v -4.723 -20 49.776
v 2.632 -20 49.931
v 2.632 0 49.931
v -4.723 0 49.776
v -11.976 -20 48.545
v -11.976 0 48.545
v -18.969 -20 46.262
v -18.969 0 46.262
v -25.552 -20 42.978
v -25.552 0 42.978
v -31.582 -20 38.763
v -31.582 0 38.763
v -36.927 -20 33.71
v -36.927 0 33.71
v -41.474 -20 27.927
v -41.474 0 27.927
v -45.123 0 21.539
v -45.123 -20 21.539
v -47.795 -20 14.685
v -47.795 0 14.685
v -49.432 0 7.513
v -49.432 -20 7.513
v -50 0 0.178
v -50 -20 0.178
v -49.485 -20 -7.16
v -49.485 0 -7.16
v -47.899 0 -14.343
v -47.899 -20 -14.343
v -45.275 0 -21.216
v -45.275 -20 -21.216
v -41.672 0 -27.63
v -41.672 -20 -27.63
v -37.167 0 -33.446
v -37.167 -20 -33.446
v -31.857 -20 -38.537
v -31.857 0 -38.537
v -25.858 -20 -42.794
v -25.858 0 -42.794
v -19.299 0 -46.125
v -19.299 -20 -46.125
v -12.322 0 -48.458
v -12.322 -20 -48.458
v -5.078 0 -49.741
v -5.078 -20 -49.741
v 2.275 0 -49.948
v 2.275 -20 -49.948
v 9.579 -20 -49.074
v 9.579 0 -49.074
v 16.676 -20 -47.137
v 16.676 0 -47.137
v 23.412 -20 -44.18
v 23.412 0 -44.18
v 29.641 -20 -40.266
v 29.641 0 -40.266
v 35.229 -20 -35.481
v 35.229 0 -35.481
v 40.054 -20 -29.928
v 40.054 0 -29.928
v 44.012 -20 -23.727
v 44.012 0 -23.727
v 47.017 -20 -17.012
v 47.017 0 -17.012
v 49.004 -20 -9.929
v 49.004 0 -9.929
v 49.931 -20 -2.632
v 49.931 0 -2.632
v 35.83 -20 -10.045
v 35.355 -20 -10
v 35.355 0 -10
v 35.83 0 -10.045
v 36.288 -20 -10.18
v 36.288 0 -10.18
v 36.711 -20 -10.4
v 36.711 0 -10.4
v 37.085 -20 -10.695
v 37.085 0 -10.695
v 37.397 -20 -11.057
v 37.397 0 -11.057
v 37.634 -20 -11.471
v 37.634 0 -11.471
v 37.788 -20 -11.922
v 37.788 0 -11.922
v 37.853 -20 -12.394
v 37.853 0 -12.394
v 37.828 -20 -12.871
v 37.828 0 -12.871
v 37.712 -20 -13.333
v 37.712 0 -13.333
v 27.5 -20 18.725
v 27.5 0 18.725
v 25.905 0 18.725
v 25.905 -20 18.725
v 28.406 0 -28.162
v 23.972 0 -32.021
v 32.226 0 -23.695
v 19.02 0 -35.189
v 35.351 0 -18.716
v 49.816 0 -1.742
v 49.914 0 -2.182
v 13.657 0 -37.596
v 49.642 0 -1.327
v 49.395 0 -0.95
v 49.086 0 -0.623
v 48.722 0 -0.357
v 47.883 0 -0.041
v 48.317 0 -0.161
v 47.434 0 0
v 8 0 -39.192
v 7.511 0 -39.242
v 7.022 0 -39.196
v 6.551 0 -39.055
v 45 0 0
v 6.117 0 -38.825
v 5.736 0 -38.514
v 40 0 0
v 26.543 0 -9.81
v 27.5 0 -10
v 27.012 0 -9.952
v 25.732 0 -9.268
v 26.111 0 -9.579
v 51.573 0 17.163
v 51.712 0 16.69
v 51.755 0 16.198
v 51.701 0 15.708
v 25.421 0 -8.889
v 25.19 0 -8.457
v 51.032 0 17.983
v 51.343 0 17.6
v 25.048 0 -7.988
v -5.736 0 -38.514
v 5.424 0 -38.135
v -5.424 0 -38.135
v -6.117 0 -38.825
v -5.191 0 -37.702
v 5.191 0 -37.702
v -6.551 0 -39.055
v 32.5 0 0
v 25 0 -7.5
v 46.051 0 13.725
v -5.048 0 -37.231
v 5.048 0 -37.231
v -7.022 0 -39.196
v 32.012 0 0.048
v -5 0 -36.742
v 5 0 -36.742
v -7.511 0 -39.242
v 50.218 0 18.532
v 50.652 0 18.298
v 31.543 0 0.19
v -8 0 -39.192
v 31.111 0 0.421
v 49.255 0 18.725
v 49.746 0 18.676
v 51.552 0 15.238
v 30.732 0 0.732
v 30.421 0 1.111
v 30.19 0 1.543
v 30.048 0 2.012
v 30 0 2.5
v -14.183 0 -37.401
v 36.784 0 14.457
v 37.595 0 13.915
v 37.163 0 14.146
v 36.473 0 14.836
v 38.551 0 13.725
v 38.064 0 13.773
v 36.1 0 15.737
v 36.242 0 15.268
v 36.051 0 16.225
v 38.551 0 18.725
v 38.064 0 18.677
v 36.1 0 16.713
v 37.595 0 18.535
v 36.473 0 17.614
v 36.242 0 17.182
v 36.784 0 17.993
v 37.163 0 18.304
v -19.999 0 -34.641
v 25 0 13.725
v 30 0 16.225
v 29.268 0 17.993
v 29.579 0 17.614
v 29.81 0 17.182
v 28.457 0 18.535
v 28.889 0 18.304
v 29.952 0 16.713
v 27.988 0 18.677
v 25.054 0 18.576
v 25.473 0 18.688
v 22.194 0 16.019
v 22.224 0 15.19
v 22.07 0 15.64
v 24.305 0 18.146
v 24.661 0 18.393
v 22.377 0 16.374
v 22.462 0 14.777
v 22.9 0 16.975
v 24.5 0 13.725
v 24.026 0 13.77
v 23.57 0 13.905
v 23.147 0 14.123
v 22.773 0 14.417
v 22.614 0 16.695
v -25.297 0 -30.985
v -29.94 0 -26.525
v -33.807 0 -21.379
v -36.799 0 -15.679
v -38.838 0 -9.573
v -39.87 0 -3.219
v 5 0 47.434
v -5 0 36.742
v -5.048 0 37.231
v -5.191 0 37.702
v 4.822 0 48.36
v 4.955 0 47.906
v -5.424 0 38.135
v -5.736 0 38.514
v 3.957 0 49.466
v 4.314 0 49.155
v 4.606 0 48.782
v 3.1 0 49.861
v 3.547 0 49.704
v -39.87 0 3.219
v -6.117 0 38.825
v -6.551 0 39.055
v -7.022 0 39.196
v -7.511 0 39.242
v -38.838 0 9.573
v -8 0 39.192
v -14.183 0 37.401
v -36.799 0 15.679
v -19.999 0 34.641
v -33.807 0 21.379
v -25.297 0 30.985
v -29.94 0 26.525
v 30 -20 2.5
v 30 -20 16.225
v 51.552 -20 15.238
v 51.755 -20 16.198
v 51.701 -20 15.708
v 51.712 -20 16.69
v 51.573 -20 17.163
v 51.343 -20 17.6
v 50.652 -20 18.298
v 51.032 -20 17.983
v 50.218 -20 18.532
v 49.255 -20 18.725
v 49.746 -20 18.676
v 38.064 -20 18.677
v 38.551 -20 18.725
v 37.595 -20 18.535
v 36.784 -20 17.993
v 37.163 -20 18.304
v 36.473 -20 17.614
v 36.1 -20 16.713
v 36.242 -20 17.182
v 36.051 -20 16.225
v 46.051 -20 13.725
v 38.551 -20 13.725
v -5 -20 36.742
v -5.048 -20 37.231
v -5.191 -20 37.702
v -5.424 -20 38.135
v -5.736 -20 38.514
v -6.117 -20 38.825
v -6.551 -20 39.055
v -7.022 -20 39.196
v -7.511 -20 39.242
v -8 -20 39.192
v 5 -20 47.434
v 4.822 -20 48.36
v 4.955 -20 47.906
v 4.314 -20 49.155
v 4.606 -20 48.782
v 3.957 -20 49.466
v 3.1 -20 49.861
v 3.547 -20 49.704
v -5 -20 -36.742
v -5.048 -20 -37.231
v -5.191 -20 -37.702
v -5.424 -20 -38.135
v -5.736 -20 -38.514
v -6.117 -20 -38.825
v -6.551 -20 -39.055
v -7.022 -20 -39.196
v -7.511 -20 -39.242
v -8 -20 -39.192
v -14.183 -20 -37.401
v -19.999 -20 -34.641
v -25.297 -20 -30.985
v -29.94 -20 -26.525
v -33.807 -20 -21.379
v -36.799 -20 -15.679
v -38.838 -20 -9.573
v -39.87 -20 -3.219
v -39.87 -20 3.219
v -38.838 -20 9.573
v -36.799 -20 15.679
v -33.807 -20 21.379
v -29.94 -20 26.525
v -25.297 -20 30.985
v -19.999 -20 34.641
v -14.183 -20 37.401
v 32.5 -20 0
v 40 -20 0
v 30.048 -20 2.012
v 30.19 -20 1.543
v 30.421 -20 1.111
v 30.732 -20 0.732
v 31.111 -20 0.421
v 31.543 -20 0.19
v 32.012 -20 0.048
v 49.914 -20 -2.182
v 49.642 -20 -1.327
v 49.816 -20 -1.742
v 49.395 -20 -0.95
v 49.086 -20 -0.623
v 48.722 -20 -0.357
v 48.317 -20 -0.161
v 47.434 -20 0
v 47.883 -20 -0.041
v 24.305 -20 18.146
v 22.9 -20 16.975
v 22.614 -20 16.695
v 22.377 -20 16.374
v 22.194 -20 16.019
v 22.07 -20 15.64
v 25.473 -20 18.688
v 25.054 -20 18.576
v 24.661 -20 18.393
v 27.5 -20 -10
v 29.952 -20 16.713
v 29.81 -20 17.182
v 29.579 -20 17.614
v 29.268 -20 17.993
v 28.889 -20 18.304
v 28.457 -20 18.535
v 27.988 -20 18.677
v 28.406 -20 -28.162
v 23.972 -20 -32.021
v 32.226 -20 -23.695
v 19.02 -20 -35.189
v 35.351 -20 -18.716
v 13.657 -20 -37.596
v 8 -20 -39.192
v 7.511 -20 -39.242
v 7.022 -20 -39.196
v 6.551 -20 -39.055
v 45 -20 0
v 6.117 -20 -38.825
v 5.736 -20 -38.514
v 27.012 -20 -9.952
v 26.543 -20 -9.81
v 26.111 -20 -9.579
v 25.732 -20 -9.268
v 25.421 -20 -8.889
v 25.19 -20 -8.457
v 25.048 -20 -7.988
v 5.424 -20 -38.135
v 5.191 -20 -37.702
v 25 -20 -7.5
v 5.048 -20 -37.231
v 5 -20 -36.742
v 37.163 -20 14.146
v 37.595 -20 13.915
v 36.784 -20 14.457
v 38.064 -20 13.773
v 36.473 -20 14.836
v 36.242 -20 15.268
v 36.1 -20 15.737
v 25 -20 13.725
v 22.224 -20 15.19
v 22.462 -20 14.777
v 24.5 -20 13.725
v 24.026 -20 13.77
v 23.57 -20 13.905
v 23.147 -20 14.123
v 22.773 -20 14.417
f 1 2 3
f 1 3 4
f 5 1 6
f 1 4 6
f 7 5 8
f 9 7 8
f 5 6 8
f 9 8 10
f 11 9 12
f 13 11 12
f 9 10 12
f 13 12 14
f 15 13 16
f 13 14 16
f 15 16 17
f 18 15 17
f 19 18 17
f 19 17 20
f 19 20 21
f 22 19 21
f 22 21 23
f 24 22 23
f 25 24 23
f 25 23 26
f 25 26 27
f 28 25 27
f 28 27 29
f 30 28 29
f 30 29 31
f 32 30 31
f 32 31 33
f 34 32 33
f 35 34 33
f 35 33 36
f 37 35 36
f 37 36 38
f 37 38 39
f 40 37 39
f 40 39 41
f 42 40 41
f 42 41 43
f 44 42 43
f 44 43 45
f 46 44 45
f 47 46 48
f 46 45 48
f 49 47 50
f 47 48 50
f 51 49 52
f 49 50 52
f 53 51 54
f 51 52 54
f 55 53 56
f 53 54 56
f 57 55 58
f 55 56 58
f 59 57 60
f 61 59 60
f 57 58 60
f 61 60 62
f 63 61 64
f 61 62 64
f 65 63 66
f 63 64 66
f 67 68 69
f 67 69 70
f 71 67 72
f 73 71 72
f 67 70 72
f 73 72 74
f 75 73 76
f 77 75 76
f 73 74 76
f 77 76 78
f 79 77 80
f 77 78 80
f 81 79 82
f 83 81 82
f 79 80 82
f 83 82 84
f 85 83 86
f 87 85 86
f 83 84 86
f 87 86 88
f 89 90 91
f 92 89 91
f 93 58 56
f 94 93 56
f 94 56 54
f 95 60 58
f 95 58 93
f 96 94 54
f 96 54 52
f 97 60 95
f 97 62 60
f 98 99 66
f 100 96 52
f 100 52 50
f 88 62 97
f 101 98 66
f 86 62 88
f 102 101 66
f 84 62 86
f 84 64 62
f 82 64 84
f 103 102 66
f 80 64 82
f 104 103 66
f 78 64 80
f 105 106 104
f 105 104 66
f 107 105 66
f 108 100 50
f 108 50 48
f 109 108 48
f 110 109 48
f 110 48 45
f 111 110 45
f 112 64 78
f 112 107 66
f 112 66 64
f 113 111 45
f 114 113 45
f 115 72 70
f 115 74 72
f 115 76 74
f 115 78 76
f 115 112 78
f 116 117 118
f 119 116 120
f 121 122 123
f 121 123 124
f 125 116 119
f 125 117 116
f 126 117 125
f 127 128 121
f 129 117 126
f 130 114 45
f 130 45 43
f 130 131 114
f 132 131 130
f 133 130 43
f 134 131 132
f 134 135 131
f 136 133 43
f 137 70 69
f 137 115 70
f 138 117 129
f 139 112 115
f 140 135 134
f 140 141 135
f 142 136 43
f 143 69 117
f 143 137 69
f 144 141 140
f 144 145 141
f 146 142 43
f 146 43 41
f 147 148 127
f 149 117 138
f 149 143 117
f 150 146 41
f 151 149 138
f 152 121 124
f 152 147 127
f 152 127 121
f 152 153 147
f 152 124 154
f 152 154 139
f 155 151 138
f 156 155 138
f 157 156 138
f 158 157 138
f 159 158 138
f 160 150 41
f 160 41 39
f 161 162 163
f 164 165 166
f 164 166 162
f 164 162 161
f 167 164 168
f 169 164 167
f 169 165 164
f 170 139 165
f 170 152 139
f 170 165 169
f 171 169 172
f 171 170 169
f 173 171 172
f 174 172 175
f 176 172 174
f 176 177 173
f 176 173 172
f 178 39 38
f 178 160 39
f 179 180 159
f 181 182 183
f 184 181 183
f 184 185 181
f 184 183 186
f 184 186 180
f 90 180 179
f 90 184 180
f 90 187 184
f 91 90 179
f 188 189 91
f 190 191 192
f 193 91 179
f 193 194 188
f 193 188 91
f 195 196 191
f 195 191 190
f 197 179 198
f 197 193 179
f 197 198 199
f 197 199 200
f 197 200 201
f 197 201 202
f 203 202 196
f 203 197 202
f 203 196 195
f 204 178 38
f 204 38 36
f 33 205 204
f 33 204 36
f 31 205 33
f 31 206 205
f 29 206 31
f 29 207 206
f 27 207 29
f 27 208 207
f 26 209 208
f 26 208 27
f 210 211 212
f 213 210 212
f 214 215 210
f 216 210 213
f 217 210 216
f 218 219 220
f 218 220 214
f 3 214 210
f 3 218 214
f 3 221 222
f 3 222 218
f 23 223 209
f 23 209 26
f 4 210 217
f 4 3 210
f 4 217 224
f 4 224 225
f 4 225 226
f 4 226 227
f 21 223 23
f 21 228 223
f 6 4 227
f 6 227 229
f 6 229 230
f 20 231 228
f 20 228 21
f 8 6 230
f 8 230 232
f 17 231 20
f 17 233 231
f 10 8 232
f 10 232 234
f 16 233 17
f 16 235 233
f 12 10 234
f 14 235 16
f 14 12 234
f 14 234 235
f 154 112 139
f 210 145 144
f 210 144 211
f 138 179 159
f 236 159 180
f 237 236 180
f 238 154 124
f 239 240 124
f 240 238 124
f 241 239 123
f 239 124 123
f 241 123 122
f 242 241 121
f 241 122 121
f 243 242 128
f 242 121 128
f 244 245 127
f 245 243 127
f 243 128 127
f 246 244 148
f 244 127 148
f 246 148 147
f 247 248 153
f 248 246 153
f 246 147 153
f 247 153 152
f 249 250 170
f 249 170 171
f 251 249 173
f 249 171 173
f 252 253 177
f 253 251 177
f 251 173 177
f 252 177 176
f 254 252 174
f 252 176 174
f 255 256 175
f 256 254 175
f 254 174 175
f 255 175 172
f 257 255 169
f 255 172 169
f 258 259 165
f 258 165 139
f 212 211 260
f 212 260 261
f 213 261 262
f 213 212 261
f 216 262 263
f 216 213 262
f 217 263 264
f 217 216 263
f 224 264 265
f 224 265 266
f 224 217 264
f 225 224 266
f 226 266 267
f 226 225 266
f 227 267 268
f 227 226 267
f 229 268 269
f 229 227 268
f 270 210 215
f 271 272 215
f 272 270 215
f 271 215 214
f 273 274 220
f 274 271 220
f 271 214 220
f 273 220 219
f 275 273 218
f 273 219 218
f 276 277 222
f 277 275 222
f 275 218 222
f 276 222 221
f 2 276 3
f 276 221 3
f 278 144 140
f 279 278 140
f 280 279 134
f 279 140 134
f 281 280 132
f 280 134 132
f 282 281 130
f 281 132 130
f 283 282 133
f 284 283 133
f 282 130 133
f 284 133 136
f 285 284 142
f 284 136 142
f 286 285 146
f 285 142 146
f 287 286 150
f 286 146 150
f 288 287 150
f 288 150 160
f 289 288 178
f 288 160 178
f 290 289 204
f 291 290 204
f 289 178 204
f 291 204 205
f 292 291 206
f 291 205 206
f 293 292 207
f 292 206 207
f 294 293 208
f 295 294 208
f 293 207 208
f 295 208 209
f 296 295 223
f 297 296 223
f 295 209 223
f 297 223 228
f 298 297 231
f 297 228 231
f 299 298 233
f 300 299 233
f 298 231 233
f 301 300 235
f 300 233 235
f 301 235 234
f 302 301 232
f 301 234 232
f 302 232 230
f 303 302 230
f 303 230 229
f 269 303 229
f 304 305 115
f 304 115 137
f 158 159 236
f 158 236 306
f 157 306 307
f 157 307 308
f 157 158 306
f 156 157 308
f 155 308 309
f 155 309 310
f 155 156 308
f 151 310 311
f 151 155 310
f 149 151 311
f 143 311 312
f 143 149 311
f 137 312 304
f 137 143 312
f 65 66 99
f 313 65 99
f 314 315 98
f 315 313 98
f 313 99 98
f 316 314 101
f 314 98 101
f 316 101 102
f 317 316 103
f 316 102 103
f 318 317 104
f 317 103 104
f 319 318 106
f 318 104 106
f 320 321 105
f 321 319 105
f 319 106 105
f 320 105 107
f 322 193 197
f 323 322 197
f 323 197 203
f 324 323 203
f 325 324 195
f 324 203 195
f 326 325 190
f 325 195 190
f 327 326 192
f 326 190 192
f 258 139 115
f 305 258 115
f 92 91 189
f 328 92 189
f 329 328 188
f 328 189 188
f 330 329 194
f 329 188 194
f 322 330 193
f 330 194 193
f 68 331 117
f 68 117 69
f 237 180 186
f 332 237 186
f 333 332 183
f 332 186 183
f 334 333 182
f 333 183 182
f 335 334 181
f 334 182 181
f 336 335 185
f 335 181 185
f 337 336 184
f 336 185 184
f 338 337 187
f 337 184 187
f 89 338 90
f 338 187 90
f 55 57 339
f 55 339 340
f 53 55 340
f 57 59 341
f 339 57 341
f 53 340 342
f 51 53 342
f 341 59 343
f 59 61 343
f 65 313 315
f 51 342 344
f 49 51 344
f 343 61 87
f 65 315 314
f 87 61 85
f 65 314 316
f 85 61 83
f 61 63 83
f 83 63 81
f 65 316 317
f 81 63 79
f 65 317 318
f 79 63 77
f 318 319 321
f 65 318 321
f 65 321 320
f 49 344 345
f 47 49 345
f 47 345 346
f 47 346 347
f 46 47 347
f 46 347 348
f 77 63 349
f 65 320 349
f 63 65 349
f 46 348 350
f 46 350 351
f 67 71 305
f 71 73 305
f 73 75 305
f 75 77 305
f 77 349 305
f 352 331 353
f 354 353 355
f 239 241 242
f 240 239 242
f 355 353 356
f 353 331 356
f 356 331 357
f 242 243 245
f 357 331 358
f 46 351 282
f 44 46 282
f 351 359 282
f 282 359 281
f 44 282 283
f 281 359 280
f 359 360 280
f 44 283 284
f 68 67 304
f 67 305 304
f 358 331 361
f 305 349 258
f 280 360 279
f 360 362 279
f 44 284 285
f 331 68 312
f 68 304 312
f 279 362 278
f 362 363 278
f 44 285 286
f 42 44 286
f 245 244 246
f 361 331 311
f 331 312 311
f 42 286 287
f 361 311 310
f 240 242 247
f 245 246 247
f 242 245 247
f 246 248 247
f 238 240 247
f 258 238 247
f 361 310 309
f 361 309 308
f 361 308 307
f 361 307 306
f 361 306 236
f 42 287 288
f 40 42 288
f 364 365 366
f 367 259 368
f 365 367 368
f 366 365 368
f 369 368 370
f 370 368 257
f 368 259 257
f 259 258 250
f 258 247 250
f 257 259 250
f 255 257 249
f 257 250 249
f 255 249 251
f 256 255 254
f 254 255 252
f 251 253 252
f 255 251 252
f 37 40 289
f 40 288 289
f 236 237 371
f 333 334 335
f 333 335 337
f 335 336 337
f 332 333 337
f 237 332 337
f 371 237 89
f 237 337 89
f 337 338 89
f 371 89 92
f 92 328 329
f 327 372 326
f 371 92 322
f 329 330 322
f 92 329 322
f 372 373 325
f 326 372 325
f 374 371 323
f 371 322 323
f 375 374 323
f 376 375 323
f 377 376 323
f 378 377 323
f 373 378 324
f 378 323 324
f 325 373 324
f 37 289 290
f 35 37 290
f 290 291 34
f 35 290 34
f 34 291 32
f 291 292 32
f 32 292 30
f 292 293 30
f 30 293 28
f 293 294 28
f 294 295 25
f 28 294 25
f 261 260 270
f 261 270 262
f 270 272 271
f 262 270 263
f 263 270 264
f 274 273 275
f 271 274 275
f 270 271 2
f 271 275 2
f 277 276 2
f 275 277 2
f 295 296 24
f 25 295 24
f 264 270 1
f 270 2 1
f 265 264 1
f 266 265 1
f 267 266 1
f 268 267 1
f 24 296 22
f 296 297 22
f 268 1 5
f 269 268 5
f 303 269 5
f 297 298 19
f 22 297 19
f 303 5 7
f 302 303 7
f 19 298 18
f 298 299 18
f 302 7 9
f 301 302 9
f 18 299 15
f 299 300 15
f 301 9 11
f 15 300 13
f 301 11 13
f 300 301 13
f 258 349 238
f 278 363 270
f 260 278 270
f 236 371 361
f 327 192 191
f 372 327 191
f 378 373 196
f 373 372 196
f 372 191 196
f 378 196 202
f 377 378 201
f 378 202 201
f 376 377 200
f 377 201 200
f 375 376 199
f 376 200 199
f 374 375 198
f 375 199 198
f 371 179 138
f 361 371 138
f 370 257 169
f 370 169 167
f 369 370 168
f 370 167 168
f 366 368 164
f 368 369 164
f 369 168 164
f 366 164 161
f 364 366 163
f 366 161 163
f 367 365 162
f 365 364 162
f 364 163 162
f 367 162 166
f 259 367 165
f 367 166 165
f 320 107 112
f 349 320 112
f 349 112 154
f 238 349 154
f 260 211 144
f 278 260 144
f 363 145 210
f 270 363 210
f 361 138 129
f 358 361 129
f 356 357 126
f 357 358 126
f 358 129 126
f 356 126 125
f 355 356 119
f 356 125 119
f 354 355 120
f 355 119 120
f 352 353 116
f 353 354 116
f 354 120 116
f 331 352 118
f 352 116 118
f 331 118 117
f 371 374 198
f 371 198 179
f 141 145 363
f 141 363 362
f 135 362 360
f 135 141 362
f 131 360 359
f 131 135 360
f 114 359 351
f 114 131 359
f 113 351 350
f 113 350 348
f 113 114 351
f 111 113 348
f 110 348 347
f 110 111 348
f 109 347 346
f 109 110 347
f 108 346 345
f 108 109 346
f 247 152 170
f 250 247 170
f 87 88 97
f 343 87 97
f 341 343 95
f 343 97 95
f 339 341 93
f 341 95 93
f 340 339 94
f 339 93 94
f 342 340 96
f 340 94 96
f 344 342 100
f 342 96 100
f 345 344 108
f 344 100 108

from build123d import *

# Parameters (mm, degrees)
F1_DEPTH     = 20
F2_T1_DEPTH  = 20
F2_T3_DEPTH  = 31.8767610709
F2_T5_DEPTH  = 38.9813299321
F2_T7_DEPTH  = 32.5
F2_T9_DEPTH  = 33.1624563251
F2_T11_DEPTH = 24.5256241898
F2_T13_DEPTH = 25.8546868248


# Not quite as in the source:
# - a fillet or chamfer that OpenCascade refuses, or shapes differently, is made with other operations: its cross-section is extruded or revolved along the edge and cut away or added


with BuildPart() as f1:
    # F0 (on Front) → F1 (new body)
    with BuildSketch(Plane.XZ):
        with BuildLine():
            Line((5, -39.686269666), (5, 0))
            Line((5, 0), (5, 49.7493718553))
            ThreePointArc((5, 49.7493718553), (-37.0809924355, -33.5410196625), (50, 0))
            Line((50, 0), (45, 0))
            Line((45, 0), (53.0514801827, 18.7251443562))
            Line((53.0514801827, 18.7251443562), (36.0514801827, 18.7251443562))
            Line((36.0514801827, 18.7251443562), (36.0514801827, 13.7251443562))
            Line((36.0514801827, 13.7251443562), (46.0514801827, 13.7251443562))
            Line((46.0514801827, 13.7251443562), (40, 0))
            Line((40, 0), (30, 0))
            Line((30, 0), (30, 18.7251443562))
            Line((30, 18.7251443562), (25, 18.7251443562))
            Line((25, 18.7251443562), (22, 16.2251443562))
            Line((22, 16.2251443562), (22, 13.7251443562))
            Line((22, 13.7251443562), (25, 13.7251443562))
            Line((25, 13.7251443562), (25, 0))
            Line((25, 0), (25, -10))
            Line((25, -10), (38.7298334621, -10))
            ThreePointArc((38.7298334621, -10), (26.4271306677, -30.0267674696), (5, -39.686269666))
        make_face()
        with BuildLine():
            Line((-5, 39.686269666), (-5, 0))
            Line((-5, 0), (-5, -39.686269666))
            ThreePointArc((-5, -39.686269666), (-40, 0), (-5, 39.686269666))
        make_face(mode=Mode.SUBTRACT)
    extrude(amount=F1_DEPTH)

    # F2: fillet of radius 2.5 on 15 edges, made by hand

    # F2_s2 → F2_t1 (join)
    with BuildSketch(Plane.XZ):
        with BuildLine():
            ThreePointArc((30, 2.5), (30.732233047, 0.732233047), (32.5, 0))
            Line((32.5, 0), (30, 0))
            Line((30, 0), (30, 2.5))
        make_face()
        with BuildLine():
            ThreePointArc((35.3553390593, -10), (37.3965805116, -11.056624327), (37.7123616633, -13.3333333333))
            ThreePointArc((37.7123616633, -13.3333333333), (38.2574185835, -11.677753351), (38.7298334621, -10))
            Line((38.7298334621, -10), (35.3553390593, -10))
        make_face()
        with BuildLine():
            ThreePointArc((-5, 36.7423461417), (-5.9188611699, 38.6788378149), (-8, 39.1918358845))
            ThreePointArc((-8, 39.1918358845), (-6.5046995466, 39.4675674929), (-5, 39.686269666))
            Line((-5, 39.686269666), (-5, 36.7423461417))
        make_face()
        with BuildLine():
            ThreePointArc((-5, -36.7423461417), (-5.9188611699, -38.6788378149), (-8, -39.1918358845))
            ThreePointArc((-8, -39.1918358845), (-6.5046995466, -39.4675674929), (-5, -39.686269666))
            Line((-5, -39.686269666), (-5, -36.7423461417))
        make_face()
        with BuildLine():
            ThreePointArc((5, -36.7423461417), (5.9188611699, -38.6788378149), (8, -39.1918358845))
            ThreePointArc((8, -39.1918358845), (6.5046995466, -39.4675674929), (5, -39.686269666))
            Line((5, -39.686269666), (5, -36.7423461417))
        make_face()
    extrude(amount=F2_T1_DEPTH)

    # F2_s4 → F2_t3 (cut)
    with BuildSketch(Plane.XZ.offset(-5.9383805354)):
        with BuildLine():
            ThreePointArc((5, 47.4341649025), (4.3136906253, 49.1547829066), (2.6315789474, 49.9306998974))
            ThreePointArc((2.6315789474, 49.9306998974), (3.8168664205, 49.8541024463), (5, 49.7493718553))
            Line((5, 49.7493718553), (5, 47.4341649025))
        make_face()
    extrude(amount=F2_T3_DEPTH, mode=Mode.SUBTRACT)

    # F2_s6 → F2_t5 (cut)
    with BuildSketch(Plane.XZ.offset(-9.490664966)):
        with BuildLine():
            ThreePointArc((51.5519019376, 15.2376093346), (51.3431363158, 17.6001284372), (49.2552141963, 18.7251443562))
            Line((49.2552141963, 18.7251443562), (53.0514801827, 18.7251443562))
            Line((53.0514801827, 18.7251443562), (51.5519019376, 15.2376093346))
        make_face()
    extrude(amount=F2_T5_DEPTH, mode=Mode.SUBTRACT)

    # F2_s8 → F2_t7 (cut)
    with BuildSketch(Plane.XZ.offset(-6.25)):
        with BuildLine():
            ThreePointArc((30, 16.2251443562), (29.267766953, 17.9929113092), (27.5, 18.7251443562))
            Line((27.5, 18.7251443562), (30, 18.7251443562))
            Line((30, 18.7251443562), (30, 16.2251443562))
        make_face()
        with BuildLine():
            ThreePointArc((22, 16.2251443562), (22.732233047, 14.4573774032), (24.5, 13.7251443562))
            Line((24.5, 13.7251443562), (22, 13.7251443562))
            Line((22, 13.7251443562), (22, 16.2251443562))
        make_face()
        with BuildLine():
            ThreePointArc((25, -7.5), (25.732233047, -9.267766953), (27.5, -10))
            Line((27.5, -10), (25, -10))
            Line((25, -10), (25, -7.5))
        make_face()
        with BuildLine():
            ThreePointArc((38.5514801827, 18.7251443562), (36.7837132297, 17.9929113092), (36.0514801827, 16.2251443562))
            Line((36.0514801827, 16.2251443562), (36.0514801827, 18.7251443562))
            Line((36.0514801827, 18.7251443562), (38.5514801827, 18.7251443562))
        make_face()
        with BuildLine():
            ThreePointArc((36.0514801827, 16.2251443562), (36.7837132297, 14.4573774032), (38.5514801827, 13.7251443562))
            Line((38.5514801827, 13.7251443562), (36.0514801827, 13.7251443562))
            Line((36.0514801827, 13.7251443562), (36.0514801827, 16.2251443562))
        make_face()
    extrude(amount=F2_T7_DEPTH, mode=Mode.SUBTRACT)

    # F2_s10 → F2_t9 (cut)
    with BuildSketch(Plane.XZ.offset(-6.5812281626)):
        with BuildLine():
            ThreePointArc((49.9306998974, -2.6315789474), (49.2478555278, -0.779381996), (47.4341649025, 0))
            Line((47.4341649025, 0), (50, 0))
            ThreePointArc((50, 0), (49.9826719717, -1.3162456325), (49.9306998974, -2.6315789474))
        make_face()
    extrude(amount=F2_T9_DEPTH, mode=Mode.SUBTRACT)

    # F2_s12 → F2_t11 (cut)
    with BuildSketch(Plane.XZ.offset(-2.2628120949)):
        with BuildLine():
            ThreePointArc((25.905124838, 18.7251443562), (25.0540616786, 18.5758233004), (24.3046638388, 18.1456975552))
            Line((24.3046638388, 18.1456975552), (25, 18.7251443562))
            Line((25, 18.7251443562), (25.905124838, 18.7251443562))
        make_face()
    extrude(amount=F2_T11_DEPTH, mode=Mode.SUBTRACT)

    # F2_s14 → F2_t13 (cut)
    with BuildSketch(Plane.XZ.offset(-2.9273434124)):
        with BuildLine():
            ThreePointArc((22.8995390008, 16.9747601902), (22.2360264469, 16.1145954819), (22, 15.0542069912))
            Line((22, 15.0542069912), (22, 16.2251443562))
            Line((22, 16.2251443562), (22.8995390008, 16.9747601902))
        make_face()
    extrude(amount=F2_T13_DEPTH, mode=Mode.SUBTRACT)


solid = f1.part
